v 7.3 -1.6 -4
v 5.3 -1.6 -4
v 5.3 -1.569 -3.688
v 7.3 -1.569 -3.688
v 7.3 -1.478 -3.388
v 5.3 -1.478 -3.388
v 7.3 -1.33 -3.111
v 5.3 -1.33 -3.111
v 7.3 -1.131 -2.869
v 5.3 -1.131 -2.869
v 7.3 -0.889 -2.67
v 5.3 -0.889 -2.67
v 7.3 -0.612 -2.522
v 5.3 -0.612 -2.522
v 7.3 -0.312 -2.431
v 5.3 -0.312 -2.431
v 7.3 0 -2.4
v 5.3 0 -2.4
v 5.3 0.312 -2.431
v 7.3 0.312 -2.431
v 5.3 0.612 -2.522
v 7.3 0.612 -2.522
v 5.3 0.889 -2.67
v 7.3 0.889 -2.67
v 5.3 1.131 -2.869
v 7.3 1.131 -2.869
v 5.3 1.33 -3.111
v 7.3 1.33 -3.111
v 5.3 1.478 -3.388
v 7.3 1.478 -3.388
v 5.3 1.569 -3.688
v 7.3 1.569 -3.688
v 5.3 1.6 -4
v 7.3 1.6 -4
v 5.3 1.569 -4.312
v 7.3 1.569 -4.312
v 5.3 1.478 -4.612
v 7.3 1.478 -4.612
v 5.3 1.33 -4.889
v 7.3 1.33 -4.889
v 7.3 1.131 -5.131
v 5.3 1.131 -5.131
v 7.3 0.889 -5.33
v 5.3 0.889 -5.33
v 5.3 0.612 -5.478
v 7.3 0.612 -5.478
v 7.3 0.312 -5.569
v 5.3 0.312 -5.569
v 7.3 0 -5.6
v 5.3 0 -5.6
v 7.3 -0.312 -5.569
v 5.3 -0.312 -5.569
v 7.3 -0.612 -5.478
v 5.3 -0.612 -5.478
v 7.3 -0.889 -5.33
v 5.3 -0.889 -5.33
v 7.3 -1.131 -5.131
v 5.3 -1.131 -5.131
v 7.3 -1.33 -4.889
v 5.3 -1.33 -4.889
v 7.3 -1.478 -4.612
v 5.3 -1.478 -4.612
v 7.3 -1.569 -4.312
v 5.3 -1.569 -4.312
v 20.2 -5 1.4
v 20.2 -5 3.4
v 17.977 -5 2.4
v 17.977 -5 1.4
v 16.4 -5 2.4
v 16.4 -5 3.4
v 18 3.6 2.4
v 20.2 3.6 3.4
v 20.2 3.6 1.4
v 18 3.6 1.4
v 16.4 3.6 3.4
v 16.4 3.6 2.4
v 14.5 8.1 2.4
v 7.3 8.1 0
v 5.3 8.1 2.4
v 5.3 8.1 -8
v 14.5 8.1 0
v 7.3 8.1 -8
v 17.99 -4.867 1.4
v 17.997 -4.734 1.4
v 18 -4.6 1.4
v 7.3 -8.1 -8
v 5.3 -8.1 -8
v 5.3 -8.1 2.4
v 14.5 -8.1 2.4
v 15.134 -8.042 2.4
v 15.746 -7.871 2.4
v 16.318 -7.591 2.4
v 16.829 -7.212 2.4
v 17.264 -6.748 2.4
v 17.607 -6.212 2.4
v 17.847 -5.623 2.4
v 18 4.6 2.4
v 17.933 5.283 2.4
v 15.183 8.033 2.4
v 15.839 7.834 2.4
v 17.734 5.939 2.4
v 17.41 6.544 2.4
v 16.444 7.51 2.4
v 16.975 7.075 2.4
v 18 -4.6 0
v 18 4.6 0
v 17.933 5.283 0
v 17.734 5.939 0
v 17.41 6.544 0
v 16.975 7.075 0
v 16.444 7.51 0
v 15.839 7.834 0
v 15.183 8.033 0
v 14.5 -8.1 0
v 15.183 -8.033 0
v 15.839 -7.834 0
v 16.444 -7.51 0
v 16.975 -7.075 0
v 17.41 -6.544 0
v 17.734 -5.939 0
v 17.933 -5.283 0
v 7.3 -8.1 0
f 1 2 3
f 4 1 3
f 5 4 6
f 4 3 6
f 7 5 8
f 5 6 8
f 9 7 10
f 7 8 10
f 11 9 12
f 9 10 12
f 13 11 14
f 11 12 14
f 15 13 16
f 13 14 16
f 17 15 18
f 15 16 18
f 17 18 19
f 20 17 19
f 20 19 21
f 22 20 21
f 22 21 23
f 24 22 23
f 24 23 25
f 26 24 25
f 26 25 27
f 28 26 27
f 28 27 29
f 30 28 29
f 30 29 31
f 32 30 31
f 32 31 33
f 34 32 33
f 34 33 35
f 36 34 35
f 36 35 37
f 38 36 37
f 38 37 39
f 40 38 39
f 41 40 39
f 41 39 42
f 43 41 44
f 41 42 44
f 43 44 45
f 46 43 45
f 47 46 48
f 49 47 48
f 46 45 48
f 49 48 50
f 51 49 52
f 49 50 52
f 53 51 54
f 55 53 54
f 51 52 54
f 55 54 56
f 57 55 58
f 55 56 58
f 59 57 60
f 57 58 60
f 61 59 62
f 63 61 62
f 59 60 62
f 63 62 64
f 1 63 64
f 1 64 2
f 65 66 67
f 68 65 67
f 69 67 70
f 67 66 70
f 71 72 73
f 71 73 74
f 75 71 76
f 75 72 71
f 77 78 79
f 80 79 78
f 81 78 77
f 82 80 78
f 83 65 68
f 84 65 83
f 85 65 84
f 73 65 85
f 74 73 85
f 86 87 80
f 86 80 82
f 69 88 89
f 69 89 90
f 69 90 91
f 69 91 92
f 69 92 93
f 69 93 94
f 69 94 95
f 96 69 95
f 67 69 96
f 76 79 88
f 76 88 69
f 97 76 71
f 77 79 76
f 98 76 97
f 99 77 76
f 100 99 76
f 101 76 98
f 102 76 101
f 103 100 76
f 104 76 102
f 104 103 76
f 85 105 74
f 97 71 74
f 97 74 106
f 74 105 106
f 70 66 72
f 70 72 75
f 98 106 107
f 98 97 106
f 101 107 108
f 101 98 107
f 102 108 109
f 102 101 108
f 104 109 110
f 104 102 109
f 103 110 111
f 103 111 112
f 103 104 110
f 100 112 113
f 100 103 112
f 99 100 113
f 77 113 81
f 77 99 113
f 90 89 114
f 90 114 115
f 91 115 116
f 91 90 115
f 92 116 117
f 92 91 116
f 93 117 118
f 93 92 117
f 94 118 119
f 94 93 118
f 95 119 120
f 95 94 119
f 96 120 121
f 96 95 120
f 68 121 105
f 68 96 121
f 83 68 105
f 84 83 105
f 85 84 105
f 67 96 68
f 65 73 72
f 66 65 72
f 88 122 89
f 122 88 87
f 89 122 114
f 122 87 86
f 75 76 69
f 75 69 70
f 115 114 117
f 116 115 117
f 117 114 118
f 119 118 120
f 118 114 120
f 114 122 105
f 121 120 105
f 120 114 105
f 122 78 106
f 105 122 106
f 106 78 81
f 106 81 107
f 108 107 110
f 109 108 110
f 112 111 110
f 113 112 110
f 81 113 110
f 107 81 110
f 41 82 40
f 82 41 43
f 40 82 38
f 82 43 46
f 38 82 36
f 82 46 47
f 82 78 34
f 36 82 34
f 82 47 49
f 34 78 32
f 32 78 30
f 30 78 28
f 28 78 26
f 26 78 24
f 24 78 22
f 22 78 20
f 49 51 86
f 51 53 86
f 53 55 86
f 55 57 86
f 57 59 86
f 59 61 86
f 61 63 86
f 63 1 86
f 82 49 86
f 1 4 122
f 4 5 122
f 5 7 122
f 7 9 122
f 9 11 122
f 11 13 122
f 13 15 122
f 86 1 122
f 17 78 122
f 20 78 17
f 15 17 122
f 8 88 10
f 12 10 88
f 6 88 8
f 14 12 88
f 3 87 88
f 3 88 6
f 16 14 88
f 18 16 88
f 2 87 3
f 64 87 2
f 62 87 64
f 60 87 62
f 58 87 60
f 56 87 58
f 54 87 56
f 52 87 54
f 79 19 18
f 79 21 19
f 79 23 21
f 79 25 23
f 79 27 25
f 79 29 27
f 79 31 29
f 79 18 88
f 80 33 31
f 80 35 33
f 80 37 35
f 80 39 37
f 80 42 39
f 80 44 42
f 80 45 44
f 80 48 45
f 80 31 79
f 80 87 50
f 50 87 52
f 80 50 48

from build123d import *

# Parameters (mm, degrees)
F0_W      = 36
F0_H      = 16.2
F1_DEPTH  = 2.4
F2_R      = 3.5
F4_W      = 3.8
F4_H      = 2
F5_DEPTH  = 8.6
F7_W      = 14.6
F7_H      = 16.2
F8_DEPTH  = 8
F9_R      = 1.6
F10_DEPTH = 14.6
F11_START = -8.001
F6_W      = 14.9
F6_H      = 16.2
F11_DEPTH = 11.402


with BuildPart() as f1:
    # F0 (on Top) → F1 (new body)
    with BuildSketch(Plane.XY):
        Rectangle(F0_W, F0_H)
    extrude(amount=F1_DEPTH)

    # F2
    f2_edges = [f1.edges().sort_by_distance(p)[0] for p in [
        (-18, -8.1, 1.2),
        (-18, 8.1, 1.2),
        (18, -8.1, 1.2),
        (18, 8.1, 1.2),
    ]]
    fillet(f2_edges, radius=F2_R)

    # F4 (on offset) → F5 (join)
    with BuildSketch(Plane(origin=(0, 3.6, 0), x_dir=(-1, 0, 0), z_dir=(0, 1, 0))):
        with Locations((-18.3, 2.4)):
            Rectangle(F4_W, F4_H)
        with Locations((18.3, 2.4)):
            Rectangle(F4_W, F4_H)
    extrude(amount=-F5_DEPTH)

    # F7 (on face) → F8 (join)
    with BuildSketch(Plane(origin=(0, 0, 0), x_dir=(1, 0, 0), z_dir=(0, 0, -1))):
        Rectangle(F7_W, F7_H)
    extrude(amount=F8_DEPTH)

    # F9 (on face) → F10 (cut, through all)
    with BuildSketch(Plane(origin=(-7.3, 0, 0), x_dir=(0, -1, 0), z_dir=(-1, 0, 0))):
        with Locations((0, -4)):
            Circle(F9_R)
    extrude(amount=-F10_DEPTH, mode=Mode.SUBTRACT)

    # F6 (on Top) → F11 (intersect)
    with BuildSketch(Plane.XY.offset(F11_START)):
        with Locations((12.75, 0)):
            Rectangle(F6_W, F6_H)
    extrude(amount=F11_DEPTH, mode=Mode.INTERSECT)


solid = f1.part
